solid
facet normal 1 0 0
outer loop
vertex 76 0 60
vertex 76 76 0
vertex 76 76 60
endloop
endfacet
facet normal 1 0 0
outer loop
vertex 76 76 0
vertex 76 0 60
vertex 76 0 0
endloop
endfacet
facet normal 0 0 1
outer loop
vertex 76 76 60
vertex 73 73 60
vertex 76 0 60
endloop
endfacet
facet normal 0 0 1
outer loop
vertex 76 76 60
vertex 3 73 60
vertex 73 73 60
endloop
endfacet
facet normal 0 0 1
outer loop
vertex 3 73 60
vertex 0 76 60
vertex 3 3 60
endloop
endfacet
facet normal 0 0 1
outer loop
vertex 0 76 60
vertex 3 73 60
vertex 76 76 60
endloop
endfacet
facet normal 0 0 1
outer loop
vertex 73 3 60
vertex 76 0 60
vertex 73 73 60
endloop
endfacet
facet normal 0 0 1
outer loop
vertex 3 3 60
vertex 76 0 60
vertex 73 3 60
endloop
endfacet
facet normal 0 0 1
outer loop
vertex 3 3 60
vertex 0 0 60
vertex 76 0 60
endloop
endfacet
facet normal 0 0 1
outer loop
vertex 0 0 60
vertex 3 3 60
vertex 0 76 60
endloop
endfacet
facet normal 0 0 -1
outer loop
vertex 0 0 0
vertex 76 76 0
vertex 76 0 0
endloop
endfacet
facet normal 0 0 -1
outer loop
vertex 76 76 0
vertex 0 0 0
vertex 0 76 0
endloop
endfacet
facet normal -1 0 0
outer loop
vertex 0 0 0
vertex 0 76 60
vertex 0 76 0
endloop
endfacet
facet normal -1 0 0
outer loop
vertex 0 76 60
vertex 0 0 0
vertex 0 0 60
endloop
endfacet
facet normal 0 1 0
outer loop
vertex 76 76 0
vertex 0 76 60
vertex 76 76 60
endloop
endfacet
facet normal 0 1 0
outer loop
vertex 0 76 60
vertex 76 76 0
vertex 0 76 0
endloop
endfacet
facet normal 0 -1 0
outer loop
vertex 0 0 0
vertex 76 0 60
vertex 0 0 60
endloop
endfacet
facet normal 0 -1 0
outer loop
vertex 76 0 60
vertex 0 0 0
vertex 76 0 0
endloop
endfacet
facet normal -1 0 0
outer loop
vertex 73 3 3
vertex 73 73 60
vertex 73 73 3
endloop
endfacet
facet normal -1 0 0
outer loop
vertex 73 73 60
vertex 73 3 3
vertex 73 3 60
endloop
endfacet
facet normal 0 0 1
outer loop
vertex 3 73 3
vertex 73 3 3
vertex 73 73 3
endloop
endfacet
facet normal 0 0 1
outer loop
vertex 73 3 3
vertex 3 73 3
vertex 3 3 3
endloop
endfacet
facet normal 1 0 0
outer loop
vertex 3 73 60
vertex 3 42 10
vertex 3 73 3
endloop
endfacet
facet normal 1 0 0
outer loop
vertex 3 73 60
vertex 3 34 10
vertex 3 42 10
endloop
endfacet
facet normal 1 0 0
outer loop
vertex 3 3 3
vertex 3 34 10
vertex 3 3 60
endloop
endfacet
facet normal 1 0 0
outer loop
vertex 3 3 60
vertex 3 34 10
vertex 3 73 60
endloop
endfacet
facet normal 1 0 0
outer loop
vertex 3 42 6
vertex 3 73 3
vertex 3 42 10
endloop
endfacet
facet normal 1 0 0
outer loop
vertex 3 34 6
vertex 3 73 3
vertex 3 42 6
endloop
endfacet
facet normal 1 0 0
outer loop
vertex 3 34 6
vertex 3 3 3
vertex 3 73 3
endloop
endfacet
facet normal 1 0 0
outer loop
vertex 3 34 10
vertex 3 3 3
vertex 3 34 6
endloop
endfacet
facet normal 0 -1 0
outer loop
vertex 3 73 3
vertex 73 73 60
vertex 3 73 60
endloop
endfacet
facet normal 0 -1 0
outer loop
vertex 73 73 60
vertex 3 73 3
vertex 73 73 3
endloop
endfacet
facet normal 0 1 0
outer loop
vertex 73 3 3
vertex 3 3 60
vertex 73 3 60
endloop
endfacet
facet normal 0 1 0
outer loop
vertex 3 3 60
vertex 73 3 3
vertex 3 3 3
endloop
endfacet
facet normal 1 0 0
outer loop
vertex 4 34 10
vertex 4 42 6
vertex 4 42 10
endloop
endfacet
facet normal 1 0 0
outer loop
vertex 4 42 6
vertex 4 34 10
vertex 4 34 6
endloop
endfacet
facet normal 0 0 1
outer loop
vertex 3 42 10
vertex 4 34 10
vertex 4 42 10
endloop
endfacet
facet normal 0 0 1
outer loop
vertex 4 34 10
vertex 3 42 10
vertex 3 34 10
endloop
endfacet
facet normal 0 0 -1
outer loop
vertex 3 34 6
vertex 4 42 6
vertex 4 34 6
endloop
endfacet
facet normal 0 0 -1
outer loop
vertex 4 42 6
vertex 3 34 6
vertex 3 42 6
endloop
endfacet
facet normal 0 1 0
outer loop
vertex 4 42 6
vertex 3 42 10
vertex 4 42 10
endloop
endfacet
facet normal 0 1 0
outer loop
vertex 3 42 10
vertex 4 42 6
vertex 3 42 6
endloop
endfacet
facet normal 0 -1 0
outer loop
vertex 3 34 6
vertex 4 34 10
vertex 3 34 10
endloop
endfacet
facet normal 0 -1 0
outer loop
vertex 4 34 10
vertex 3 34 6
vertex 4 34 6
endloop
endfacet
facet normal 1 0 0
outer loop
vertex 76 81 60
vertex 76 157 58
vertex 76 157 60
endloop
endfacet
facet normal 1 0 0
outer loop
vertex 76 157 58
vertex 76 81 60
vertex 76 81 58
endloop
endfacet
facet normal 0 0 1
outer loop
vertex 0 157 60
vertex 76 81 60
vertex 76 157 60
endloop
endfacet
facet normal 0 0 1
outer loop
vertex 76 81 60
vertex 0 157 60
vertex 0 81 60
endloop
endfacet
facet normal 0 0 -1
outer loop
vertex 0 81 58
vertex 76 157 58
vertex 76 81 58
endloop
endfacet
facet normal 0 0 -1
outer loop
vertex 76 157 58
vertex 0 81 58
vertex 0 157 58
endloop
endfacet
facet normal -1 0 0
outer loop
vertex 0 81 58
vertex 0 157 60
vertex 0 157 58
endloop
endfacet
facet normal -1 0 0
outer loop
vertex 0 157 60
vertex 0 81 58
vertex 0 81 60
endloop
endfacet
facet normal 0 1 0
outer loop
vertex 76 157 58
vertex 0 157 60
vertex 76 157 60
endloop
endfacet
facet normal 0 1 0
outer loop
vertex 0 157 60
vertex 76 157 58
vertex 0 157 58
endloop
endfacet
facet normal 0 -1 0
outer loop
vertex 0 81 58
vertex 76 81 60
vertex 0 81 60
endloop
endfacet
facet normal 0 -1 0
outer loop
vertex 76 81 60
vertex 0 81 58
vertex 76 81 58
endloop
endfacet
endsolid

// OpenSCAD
/*
  Light‑Box Pedestal — Parametric (OpenSCAD)
  - Square pedestal with internal LED chamber and diffuser seat
  - Choose printed diffuser OR 3 mm acrylic insert
*/

// ==== Parameters ====
inner_w = 70;      // internal cavity width (mm)
inner_d = 70;      // internal cavity depth (mm)
height  = 60;      // overall pedestal height (mm)

wall_th = 3;       // wall thickness
lip_th  = 2;       // top lip thickness supporting diffuser
diff_th = 2;       // PRINTED diffuser thickness
acrylic_th = 3;    // if using acrylic

led_shelf_h = 18;  // height of internal LED shelf from base
cable_slot_w = 8;  // cable slot width
cable_slot_h = 4;  // cable slot height

use_printed_diffuser = true;  // set false for acrylic slot

$fn=96;

// ==== Derived ====
outer_w = inner_w + 2*wall_th;
outer_d = inner_d + 2*wall_th;
outer_h = height;

module box_shell(w,d,h,t){
    difference(){
        cube([w,d,h], center=false);
        translate([t,t,t]) cube([w-2*t, d-2*t, h-t], center=false);
    }
}

module cable_slot(){
    translate([0, (outer_d-cable_slot_w)/2, 6])
        cube([wall_th+1, cable_slot_w, cable_slot_h], center=false);
}

// Pedestal body
difference(){
    // shell
    box_shell(outer_w, outer_d, outer_h, wall_th);
    // LED shelf
    translate([wall_th, wall_th, led_shelf_h])
        cube([inner_w, inner_d, wall_th], center=false);
    // diffuser seat rebate
    translate([wall_th, wall_th, outer_h - lip_th])
        cube([inner_w, inner_d, lip_th+0.2], center=false);
}

// Cable slot through one wall
cable_slot();

// === Diffuser (optional printed cap) ===
if (use_printed_diffuser){
    // printed diffuser sits on the lip
    translate([0, outer_d + 5, outer_h - diff_th])
        cube([outer_w, outer_d, diff_th], center=false);
}else{
    // separate acrylic plate: print a simple alignment frame
    frame_w = outer_w;
    frame_d = outer_d;
    frame_th = 2;
    slot_tol = 0.3; // tolerance for acrylic thickness
    translate([0, outer_d + 5, outer_h - frame_th])
    difference(){
        cube([frame_w, frame_d, frame_th], center=false);
        translate([wall_th, wall_th, 0])
            cube([inner_w, inner_d, frame_th], center=false);
        // acrylic plate model (visual)
        translate([wall_th+1, wall_th+1, frame_th])
            cube([inner_w-2, inner_d-2, acrylic_th - slot_tol], center=false);
    }
}
